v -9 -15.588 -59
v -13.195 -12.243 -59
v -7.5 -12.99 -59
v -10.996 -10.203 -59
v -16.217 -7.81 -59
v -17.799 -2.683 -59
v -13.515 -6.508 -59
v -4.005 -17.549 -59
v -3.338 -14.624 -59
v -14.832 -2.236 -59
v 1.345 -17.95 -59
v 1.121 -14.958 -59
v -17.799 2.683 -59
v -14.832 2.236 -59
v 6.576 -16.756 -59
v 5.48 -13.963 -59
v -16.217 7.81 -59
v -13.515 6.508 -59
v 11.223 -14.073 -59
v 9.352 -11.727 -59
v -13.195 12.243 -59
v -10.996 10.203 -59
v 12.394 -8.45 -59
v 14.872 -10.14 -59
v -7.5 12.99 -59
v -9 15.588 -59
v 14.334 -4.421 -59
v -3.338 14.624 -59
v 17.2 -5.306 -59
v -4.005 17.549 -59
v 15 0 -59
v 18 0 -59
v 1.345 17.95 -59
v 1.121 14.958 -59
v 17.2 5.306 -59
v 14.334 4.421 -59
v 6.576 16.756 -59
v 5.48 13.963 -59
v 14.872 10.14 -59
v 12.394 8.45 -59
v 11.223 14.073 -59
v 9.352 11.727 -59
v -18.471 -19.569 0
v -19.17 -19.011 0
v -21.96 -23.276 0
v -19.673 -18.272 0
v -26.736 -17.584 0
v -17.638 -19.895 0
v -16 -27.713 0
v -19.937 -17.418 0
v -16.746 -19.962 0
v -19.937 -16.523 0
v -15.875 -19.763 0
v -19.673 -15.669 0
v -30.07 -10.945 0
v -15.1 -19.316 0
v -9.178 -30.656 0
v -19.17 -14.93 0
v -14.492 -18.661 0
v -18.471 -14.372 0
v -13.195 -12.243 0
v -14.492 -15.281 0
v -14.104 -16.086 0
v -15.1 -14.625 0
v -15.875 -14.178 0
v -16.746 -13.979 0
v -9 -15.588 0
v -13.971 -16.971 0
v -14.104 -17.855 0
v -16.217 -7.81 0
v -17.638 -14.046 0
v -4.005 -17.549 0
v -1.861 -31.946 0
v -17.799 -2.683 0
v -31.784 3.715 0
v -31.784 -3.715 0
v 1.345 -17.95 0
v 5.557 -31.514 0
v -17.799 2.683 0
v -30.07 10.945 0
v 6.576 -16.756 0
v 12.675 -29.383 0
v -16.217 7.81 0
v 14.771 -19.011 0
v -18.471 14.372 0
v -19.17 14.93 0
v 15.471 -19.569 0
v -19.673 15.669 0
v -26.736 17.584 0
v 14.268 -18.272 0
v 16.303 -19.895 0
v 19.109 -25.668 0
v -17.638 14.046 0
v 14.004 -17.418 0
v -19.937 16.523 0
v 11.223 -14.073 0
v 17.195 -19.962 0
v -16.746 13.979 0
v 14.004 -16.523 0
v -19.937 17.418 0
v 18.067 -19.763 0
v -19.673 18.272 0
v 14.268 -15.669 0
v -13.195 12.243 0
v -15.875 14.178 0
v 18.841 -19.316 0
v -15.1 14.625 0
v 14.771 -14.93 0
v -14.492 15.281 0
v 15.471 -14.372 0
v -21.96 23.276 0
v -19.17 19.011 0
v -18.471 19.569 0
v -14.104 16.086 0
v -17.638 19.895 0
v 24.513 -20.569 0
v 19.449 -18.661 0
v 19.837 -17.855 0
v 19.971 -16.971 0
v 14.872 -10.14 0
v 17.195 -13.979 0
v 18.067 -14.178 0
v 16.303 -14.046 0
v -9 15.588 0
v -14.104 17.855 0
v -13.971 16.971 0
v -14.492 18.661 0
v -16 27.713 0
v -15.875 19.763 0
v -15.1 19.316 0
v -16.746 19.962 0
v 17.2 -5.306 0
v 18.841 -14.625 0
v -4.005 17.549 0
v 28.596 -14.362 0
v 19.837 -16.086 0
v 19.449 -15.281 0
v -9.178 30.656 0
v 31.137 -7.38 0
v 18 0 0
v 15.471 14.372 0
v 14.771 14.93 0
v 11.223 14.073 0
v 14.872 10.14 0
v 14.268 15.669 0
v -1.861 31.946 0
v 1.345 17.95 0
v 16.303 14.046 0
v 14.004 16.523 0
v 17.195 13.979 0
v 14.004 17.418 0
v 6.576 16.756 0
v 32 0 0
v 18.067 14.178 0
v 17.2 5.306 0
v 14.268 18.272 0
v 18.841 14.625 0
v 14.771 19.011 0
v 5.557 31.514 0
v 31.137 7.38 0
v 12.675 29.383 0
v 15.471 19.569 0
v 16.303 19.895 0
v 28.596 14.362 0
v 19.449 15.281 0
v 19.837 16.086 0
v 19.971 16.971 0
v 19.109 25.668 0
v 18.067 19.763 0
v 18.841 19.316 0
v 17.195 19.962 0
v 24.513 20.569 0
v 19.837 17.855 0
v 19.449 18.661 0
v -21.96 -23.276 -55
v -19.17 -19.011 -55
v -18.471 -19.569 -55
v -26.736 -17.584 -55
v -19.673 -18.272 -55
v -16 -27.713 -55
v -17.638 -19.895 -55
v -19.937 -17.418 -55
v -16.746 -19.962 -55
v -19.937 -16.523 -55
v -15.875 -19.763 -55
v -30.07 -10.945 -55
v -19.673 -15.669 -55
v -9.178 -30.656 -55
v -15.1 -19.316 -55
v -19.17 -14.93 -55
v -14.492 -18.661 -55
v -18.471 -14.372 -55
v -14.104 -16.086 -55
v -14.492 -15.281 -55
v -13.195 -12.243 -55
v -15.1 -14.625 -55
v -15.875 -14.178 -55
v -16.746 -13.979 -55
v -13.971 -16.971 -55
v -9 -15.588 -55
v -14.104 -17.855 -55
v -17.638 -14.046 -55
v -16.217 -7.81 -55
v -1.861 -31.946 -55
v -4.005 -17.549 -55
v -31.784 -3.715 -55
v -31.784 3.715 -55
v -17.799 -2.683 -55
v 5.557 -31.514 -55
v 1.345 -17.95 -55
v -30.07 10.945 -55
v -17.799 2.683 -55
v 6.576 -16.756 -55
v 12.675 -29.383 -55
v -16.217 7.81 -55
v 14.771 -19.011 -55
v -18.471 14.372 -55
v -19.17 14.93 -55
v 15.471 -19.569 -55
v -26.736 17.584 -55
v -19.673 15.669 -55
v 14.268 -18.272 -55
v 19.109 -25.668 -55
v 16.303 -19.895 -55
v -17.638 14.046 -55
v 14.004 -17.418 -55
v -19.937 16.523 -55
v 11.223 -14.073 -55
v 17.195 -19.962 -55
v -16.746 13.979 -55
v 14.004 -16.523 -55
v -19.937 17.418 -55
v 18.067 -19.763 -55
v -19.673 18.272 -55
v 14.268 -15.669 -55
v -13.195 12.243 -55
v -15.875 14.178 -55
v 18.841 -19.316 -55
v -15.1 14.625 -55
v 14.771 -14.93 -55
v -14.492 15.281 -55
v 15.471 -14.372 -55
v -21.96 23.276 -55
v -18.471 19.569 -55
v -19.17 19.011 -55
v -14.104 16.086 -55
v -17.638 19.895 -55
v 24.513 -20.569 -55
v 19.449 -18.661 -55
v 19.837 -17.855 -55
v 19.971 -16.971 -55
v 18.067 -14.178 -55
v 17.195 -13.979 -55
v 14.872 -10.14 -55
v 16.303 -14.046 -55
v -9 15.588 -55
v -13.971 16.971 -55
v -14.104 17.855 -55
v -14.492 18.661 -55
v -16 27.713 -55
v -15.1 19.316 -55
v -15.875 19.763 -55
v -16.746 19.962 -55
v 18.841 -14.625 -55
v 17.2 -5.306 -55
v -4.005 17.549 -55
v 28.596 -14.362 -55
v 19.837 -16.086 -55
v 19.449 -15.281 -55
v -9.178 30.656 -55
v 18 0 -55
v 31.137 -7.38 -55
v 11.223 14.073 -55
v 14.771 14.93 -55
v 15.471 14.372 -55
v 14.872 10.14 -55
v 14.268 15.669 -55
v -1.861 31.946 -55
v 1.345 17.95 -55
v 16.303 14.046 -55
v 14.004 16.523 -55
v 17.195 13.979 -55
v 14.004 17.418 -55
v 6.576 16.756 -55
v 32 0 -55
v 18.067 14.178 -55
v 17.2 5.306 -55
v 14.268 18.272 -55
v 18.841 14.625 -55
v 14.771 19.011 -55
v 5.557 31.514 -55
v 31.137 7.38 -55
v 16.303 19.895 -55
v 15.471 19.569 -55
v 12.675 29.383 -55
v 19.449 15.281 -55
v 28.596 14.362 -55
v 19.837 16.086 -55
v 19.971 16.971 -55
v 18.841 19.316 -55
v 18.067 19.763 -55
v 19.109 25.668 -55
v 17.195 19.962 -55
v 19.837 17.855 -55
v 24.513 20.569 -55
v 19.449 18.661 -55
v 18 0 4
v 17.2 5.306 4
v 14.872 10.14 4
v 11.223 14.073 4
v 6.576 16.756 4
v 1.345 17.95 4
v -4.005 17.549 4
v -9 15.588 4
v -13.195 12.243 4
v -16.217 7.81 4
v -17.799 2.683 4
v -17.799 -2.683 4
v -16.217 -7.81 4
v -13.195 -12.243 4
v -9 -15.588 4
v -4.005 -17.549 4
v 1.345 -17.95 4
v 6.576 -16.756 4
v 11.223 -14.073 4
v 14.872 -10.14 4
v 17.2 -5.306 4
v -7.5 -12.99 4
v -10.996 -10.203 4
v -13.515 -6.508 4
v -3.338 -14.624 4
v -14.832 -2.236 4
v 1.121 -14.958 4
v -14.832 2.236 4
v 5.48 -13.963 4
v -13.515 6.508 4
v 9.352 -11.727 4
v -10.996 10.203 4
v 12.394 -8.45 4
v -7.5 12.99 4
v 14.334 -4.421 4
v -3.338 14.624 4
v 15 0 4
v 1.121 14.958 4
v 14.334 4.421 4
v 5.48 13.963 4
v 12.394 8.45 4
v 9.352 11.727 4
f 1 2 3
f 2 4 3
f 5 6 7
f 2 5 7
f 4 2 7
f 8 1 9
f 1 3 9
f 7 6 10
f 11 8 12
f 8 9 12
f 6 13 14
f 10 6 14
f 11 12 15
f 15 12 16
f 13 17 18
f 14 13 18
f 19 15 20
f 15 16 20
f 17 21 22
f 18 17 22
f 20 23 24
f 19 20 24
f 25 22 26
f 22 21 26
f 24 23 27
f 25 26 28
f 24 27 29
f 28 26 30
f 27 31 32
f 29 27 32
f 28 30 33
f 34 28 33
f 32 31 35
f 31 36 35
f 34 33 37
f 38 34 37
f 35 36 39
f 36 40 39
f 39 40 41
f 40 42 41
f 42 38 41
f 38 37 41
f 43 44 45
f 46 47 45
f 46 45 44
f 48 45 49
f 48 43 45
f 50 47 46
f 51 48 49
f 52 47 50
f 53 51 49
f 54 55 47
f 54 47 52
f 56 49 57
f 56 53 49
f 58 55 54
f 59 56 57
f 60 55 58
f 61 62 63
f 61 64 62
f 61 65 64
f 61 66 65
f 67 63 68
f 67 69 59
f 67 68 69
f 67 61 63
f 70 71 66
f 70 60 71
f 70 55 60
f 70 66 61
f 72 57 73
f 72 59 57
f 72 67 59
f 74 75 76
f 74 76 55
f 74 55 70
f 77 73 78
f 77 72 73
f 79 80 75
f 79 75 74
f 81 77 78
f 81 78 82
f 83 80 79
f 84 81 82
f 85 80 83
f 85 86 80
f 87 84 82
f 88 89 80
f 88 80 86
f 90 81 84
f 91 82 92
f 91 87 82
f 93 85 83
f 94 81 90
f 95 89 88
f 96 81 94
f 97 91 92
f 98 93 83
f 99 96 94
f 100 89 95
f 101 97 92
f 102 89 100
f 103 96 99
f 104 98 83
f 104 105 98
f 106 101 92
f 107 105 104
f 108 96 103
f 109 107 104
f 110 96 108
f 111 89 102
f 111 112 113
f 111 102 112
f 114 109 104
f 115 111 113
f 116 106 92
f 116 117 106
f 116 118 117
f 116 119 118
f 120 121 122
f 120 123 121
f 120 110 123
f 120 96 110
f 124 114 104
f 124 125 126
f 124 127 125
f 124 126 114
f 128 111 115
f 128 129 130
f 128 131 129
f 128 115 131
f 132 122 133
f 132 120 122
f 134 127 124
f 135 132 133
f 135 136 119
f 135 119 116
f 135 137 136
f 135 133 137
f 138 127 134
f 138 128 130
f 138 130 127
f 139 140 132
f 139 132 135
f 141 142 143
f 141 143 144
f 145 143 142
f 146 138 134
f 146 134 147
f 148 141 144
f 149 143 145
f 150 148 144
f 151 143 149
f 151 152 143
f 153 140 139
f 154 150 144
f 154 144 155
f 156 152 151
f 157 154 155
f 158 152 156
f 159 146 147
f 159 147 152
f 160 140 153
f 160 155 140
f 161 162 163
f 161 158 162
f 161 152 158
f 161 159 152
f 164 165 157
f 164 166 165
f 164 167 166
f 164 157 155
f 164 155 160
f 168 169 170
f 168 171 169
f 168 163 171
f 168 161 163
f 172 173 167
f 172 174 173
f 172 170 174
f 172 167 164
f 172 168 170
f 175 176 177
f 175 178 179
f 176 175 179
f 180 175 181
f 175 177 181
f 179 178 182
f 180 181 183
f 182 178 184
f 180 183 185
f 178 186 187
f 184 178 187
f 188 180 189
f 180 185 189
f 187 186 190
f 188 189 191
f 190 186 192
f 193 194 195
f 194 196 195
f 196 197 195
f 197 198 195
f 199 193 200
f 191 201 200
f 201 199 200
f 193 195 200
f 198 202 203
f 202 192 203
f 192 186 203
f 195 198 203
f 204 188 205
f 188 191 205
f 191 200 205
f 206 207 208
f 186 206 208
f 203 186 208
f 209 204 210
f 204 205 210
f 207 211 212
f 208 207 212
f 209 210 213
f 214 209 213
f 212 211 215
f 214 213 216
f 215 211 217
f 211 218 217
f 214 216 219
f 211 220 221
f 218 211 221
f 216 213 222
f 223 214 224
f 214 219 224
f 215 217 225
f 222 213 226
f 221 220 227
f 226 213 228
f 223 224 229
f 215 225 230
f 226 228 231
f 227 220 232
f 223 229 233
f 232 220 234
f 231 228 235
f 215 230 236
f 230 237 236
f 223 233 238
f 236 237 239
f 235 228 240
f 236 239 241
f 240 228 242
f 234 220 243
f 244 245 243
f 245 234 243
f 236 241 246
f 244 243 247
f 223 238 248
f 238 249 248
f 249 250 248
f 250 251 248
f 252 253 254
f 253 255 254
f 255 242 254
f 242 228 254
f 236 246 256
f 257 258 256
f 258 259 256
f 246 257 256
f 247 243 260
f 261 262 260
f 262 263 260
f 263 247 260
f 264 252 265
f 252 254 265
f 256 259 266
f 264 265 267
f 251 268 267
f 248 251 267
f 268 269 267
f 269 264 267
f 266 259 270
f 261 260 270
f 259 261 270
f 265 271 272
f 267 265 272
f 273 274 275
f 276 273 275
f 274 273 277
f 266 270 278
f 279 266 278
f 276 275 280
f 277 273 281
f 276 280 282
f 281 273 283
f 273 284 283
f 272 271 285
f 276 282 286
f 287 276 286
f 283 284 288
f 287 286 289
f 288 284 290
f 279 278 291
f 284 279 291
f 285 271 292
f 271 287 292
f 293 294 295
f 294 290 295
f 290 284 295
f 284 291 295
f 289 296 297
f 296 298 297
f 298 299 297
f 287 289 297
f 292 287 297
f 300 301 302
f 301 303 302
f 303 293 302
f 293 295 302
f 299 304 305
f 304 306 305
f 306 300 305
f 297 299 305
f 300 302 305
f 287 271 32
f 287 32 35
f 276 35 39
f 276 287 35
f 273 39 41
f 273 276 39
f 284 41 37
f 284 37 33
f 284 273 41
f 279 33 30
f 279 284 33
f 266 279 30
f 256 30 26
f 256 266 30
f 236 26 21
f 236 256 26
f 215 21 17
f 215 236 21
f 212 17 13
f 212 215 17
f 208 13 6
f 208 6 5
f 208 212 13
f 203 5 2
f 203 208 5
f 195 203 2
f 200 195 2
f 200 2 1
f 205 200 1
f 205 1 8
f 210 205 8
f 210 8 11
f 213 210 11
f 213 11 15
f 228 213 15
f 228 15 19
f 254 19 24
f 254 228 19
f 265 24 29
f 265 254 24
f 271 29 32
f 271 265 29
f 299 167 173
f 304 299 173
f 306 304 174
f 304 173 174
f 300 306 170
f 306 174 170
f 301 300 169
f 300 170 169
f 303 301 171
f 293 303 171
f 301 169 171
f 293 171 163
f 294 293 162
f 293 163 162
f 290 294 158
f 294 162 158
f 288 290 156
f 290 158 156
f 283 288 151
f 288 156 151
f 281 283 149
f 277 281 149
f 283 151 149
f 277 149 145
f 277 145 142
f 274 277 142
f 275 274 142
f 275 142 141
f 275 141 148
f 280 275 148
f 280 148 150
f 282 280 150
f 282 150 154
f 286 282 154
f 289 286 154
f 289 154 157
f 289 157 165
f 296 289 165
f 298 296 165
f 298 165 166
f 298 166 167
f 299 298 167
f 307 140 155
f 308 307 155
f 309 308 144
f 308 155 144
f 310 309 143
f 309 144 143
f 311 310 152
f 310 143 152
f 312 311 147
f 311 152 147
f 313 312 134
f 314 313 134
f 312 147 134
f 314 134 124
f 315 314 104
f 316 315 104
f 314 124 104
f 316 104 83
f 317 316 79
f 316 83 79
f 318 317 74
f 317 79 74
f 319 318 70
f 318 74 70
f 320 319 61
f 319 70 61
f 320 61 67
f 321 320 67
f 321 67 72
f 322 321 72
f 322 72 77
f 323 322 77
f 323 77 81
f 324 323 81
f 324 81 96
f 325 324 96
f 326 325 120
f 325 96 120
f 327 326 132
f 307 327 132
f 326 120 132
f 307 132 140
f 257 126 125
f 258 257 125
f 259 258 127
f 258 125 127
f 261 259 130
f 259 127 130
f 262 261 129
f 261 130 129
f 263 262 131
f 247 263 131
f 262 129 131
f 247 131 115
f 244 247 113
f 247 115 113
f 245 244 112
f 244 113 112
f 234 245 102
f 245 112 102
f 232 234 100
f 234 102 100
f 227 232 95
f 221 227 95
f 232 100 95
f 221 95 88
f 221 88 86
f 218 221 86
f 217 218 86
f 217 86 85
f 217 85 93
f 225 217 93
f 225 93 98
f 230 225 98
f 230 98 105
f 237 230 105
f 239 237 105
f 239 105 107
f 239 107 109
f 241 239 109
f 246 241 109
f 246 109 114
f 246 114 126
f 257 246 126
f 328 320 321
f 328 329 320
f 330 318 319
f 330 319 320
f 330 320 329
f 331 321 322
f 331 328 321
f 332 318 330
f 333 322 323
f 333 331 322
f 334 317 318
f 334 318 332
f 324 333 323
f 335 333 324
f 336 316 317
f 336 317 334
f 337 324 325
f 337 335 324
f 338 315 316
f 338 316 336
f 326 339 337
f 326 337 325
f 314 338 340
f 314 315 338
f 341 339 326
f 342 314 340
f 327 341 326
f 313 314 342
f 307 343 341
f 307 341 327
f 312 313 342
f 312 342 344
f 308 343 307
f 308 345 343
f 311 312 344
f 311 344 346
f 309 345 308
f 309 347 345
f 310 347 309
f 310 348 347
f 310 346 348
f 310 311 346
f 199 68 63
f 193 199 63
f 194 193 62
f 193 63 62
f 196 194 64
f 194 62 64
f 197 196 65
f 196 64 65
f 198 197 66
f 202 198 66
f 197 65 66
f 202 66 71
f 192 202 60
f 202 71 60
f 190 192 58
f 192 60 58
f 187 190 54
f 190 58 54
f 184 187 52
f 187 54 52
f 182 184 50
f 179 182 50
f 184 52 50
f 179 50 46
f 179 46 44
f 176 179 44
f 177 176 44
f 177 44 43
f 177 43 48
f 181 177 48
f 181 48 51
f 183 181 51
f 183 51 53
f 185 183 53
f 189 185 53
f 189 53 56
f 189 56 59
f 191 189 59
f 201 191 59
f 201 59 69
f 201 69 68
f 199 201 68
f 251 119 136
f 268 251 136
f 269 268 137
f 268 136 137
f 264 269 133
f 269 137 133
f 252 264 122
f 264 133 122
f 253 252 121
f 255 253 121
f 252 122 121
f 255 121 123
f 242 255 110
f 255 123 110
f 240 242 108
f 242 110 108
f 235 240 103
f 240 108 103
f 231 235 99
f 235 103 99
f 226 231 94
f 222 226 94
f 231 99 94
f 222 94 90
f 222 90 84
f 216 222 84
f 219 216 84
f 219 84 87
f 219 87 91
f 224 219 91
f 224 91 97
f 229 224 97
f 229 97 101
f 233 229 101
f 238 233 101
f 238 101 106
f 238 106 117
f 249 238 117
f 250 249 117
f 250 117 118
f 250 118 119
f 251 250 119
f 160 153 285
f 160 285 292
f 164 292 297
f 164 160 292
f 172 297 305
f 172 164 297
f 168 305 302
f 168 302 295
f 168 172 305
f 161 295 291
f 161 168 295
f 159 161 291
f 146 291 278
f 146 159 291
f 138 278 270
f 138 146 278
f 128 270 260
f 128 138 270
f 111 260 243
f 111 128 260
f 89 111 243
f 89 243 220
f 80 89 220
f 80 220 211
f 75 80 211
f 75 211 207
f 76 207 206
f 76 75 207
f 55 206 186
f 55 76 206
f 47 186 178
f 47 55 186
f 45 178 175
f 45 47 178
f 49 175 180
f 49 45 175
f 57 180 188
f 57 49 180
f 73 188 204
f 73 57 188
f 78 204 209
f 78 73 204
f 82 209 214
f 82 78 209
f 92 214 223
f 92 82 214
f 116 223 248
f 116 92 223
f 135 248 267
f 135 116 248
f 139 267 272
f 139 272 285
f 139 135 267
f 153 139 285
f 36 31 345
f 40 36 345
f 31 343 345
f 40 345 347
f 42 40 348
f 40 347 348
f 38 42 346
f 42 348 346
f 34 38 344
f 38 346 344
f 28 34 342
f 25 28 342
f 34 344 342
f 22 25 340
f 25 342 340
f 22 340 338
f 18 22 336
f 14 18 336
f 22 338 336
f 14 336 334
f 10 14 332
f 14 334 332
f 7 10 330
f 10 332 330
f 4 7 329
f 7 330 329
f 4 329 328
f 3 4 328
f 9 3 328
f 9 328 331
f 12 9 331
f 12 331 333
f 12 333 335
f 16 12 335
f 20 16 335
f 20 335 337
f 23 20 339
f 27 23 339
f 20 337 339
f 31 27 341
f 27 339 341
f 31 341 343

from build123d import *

# Parameters (mm, degrees)
SKETCH1_R           = 32
SKETCH1_R_2         = 18
SKETCH1_R_3         = 15
BOSS_EXTRUDE1_DEPTH = 55
SKETCH1_3_R         = 18
SKETCH1_3_R_2       = 15
BOSS_EXTRUDE2_DEPTH = 4
BOSS_EXTRUDE4_START = -55
SKETCH1_6_R         = 18
SKETCH1_6_R_2       = 15
BOSS_EXTRUDE4_DEPTH = 4
SKETCH2_R           = 3
CUT_EXTRUDE1_DEPTH  = 191


with BuildPart() as part:
    # Sketch1 → Boss-Extrude1 (new body)
    with BuildSketch(Plane.XY):
        Circle(SKETCH1_R)
        Circle(SKETCH1_R_2, mode=Mode.SUBTRACT)
        Circle(SKETCH1_R_2)
        Circle(SKETCH1_R_3, mode=Mode.SUBTRACT)
    extrude(amount=-BOSS_EXTRUDE1_DEPTH)

    # Sketch1<3> → Boss-Extrude2 (add)
    with BuildSketch(Plane.XY):
        Circle(SKETCH1_3_R)
        Circle(SKETCH1_3_R_2, mode=Mode.SUBTRACT)
    extrude(amount=BOSS_EXTRUDE2_DEPTH)

    # Sketch1<6> → Boss-Extrude4 (add)
    with BuildSketch(Plane.XY.offset(BOSS_EXTRUDE4_START)):
        Circle(SKETCH1_6_R)
        Circle(SKETCH1_6_R_2, mode=Mode.SUBTRACT)
    extrude(amount=-BOSS_EXTRUDE4_DEPTH)

    # Sketch2 → Cut-Extrude1 (cut)
    with BuildSketch(Plane.XY):
        with Locations((-16.970562748, 16.970562748)):
            Circle(SKETCH2_R)
        with Locations((16.970562748, 16.970562748)):
            Circle(SKETCH2_R)
        with Locations((16.970562748, -16.970562748)):
            Circle(SKETCH2_R)
        with Locations((-16.970562748, -16.970562748)):
            Circle(SKETCH2_R)
    extrude(amount=-CUT_EXTRUDE1_DEPTH, mode=Mode.SUBTRACT)


solid = part.part
